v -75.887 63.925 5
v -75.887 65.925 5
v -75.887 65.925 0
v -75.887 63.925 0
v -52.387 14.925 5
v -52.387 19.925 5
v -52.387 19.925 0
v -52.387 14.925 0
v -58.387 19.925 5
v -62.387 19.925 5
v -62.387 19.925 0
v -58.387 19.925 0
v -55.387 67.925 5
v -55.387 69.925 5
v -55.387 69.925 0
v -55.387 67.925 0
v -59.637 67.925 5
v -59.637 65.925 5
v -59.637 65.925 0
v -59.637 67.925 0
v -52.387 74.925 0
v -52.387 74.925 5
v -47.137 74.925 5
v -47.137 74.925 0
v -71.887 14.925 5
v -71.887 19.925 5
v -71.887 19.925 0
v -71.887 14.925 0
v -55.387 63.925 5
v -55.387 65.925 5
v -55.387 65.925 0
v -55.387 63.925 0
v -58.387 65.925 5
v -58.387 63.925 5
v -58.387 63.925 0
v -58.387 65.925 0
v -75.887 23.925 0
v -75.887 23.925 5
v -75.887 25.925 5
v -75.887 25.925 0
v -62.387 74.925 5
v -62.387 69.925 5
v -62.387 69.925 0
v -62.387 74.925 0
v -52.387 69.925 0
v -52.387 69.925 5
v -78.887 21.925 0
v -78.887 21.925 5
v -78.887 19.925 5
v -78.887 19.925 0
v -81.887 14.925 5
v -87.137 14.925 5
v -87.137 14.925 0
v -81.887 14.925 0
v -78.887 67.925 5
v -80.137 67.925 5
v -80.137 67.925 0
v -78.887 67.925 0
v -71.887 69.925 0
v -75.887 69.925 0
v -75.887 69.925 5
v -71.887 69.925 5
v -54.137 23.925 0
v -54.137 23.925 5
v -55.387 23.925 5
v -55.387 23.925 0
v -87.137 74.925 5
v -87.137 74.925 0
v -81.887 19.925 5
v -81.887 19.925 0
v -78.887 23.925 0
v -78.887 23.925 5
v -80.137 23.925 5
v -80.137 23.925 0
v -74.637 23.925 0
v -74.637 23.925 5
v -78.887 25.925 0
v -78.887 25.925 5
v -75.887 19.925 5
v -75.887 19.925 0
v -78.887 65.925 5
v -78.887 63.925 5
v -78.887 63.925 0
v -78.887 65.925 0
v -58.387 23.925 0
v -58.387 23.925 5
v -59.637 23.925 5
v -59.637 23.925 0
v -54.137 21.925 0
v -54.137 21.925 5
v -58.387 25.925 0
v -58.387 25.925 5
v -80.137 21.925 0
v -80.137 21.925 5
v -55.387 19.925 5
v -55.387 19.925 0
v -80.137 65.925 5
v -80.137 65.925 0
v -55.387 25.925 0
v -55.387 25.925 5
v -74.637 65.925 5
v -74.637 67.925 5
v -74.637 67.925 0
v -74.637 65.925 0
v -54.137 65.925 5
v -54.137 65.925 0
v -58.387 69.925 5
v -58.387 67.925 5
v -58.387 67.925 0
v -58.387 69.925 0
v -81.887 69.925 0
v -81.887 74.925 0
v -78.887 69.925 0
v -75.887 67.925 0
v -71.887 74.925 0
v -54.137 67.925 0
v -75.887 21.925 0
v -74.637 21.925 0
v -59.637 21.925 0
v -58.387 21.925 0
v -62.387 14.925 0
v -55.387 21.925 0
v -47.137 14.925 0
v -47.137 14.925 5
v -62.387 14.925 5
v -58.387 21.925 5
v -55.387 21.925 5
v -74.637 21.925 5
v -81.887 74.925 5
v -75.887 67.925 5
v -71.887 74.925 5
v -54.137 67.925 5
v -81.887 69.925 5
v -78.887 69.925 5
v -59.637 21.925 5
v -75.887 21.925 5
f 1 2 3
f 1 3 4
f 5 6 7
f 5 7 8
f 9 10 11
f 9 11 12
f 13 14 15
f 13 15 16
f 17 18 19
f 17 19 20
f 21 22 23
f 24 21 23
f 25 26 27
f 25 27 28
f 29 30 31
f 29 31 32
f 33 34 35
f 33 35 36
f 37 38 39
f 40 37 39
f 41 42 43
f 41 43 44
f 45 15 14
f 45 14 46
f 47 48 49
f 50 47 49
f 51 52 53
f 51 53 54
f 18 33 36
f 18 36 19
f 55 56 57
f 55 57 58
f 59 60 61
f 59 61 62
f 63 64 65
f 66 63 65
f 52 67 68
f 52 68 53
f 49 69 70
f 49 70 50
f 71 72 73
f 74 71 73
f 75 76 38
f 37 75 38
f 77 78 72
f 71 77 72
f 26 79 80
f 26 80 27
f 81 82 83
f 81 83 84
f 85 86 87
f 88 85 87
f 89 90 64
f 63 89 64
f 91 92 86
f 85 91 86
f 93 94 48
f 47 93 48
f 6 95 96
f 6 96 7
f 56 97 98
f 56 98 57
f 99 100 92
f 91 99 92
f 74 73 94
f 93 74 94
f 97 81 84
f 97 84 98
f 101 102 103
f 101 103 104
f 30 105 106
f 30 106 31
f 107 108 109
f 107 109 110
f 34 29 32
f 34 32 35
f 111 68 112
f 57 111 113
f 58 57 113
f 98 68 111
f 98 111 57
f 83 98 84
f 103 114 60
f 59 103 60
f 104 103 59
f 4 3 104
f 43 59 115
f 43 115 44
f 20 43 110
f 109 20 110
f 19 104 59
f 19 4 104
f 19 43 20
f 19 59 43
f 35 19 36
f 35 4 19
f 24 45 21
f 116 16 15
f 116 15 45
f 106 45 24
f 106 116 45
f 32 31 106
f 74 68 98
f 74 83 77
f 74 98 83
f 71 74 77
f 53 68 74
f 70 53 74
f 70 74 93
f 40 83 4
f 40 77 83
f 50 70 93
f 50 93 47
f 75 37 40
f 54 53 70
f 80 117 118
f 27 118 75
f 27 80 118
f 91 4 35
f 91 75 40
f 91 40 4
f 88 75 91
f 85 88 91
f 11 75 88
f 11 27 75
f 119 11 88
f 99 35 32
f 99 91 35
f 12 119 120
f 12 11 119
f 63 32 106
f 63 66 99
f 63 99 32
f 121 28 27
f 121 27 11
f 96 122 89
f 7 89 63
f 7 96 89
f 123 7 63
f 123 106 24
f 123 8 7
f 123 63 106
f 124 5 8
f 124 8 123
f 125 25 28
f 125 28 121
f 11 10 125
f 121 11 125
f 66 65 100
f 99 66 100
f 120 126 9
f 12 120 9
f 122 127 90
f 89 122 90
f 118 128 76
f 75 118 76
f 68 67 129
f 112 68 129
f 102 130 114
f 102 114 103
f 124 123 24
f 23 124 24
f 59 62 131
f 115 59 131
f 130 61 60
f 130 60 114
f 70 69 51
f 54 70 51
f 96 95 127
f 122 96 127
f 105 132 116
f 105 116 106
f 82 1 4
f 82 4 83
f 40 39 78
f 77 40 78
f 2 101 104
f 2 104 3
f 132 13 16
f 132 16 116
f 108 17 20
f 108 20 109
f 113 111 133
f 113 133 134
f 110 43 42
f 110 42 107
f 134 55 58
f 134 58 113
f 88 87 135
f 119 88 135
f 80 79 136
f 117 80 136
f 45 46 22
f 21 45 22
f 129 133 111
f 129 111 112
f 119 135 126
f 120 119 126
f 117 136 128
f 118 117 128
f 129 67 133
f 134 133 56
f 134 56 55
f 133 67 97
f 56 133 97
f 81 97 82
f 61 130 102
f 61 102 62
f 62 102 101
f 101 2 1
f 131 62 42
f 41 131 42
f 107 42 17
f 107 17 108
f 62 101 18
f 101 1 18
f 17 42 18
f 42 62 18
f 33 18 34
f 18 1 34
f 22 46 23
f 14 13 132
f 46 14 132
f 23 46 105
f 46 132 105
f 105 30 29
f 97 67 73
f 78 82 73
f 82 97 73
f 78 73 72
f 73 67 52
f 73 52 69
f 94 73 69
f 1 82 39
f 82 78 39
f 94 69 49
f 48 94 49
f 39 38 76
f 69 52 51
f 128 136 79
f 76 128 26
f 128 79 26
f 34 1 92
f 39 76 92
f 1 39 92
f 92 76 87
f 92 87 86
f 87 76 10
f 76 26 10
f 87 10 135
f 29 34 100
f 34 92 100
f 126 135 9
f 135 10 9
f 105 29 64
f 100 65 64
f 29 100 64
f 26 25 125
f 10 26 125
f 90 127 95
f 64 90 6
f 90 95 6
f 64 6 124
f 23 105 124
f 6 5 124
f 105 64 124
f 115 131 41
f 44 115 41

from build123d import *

# Parameters (mm, degrees)
SKETCH1_W           = 40
SKETCH1_H           = 55
BOSS_EXTRUDE1_DEPTH = 5
SKETCH2_OUTSIDE_W   = 55.638
SKETCH2_OUTSIDE_H   = 70.638
CUT_EXTRUDE1_DEPTH  = 10
SKETCH2_3_W         = 5.25
SKETCH2_3_H         = 5
SKETCH2_3_W_2       = 9.5
BOSS_EXTRUDE2_DEPTH = 5


with BuildPart() as part:
    # Sketch1 → Boss-Extrude1 (new body)
    with BuildSketch(Plane.XY):
        with Locations((-67.136843489, 42.42527276)):
            Rectangle(SKETCH1_W, SKETCH1_H)
    extrude(amount=BOSS_EXTRUDE1_DEPTH)

    # Sketch2 outside → Cut-Extrude1 (cut)
    with BuildSketch(Plane.XY.offset(5)):
        with Locations((-67.137, 42.425)):
            Rectangle(SKETCH2_OUTSIDE_W, SKETCH2_OUTSIDE_H)
        Polygon((-75.886843489, 63.92527276), (-78.886843489, 63.92527276), (-78.886843489, 65.92527276), (-80.136843489, 65.92527276), (-80.136843489, 67.92527276), (-78.886843489, 67.92527276), (-78.886843489, 69.92527276), (-81.886843489, 69.92527276), (-87.136843489, 69.92527276), (-87.136843489, 14.92527276), (-47.136843489, 14.92527276), (-47.136843489, 69.92527276), (-52.386843489, 69.92527276), (-55.386843489, 69.92527276), (-55.386843489, 67.92527276), (-54.136843489, 67.92527276), (-54.136843489, 65.92527276), (-55.386843489, 65.92527276), (-55.386843489, 63.92527276), (-58.386843489, 63.92527276), (-58.386843489, 65.92527276), (-59.636843489, 65.92527276), (-59.636843489, 67.92527276), (-58.386843489, 67.92527276), (-58.386843489, 69.92527276), (-62.386843489, 69.92527276), (-71.886843489, 69.92527276), (-75.886843489, 69.92527276), (-75.886843489, 67.92527276), (-74.636843489, 67.92527276), (-74.636843489, 65.92527276), (-75.886843489, 65.92527276), align=None, mode=Mode.SUBTRACT)
    cut_extrude1 = extrude(amount=-CUT_EXTRUDE1_DEPTH, mode=Mode.SUBTRACT)

    # Sketch2<3> → Boss-Extrude2 (add)
    with BuildSketch(Plane.XY.offset(5)):
        with Locations((-84.511843489, 72.42527276)):
            Rectangle(SKETCH2_3_W, SKETCH2_3_H)
        with Locations((-67.136843489, 72.42527276)):
            Rectangle(SKETCH2_3_W_2, SKETCH2_3_H)
        with Locations((-49.761843489, 72.42527276)):
            Rectangle(SKETCH2_3_W, SKETCH2_3_H)
    boss_extrude2 = extrude(amount=-BOSS_EXTRUDE2_DEPTH)

    # Mirror1: Cut-Extrude1, Boss-Extrude2 across plane
    add(cut_extrude1.mirror(Plane.ZX.offset(44.92527276)), mode=Mode.SUBTRACT)
    add(boss_extrude2.mirror(Plane.ZX.offset(44.92527276)))


solid = part.part
